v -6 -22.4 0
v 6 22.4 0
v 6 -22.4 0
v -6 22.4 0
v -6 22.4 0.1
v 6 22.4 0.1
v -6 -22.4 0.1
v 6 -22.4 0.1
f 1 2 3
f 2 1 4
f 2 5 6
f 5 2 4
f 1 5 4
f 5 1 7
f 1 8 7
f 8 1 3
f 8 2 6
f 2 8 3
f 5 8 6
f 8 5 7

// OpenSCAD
// file: ../p/box5-12.scad
use <../lib.scad>
function ldraw_lib__box5_12() = [
// 0 Box with 5 Faces without Any Edges
// 0 Name: box5-12.dat
// 0 Author: Chris Dee [cwdee]
// 0 !LDRAW_ORG Primitive UPDATE 2009-02
// 0 !LICENSE Licensed under CC BY 4.0 : see CAreadme.txt
// 
// 0 BFC CERTIFY CCW
  [0,"BFC","CERTIFY"],
  [0,"BFC","CCW"],
// 
// 0 !HISTORY 2009-09-03 [PTadmin] Official Update 2009-02
// 
// 
// 4 16 1 1 1 1 1 -1 -1 1 -1 -1 1 1
  [4,16,1,1,1,1,1,-1,-1,1,-1,-1,1,1],
// 4 16 -1 0 1 1 0 1 1 1 1 -1 1 1
  [4,16,-1,0,1,1,0,1,1,1,1,-1,1,1],
// 4 16 -1 0 -1 -1 0 1 -1 1 1 -1 1 -1
  [4,16,-1,0,-1,-1,0,1,-1,1,1,-1,1,-1],
// 4 16 1 0 -1 -1 0 -1 -1 1 -1 1 1 -1
  [4,16,1,0,-1,-1,0,-1,-1,1,-1,1,1,-1],
// 4 16 1 0 1 1 0 -1 1 1 -1 1 1 1
  [4,16,1,0,1,1,0,-1,1,1,-1,1,1,1],
// 0
];
module ldraw_lib__box5_12(step=0, col=false, unit=2/5, alt=false, line=0.2, solid=!$preview)
    makepoly(ldraw_lib__box5_12(), step=step, col=col, unit=unit, alt=alt, line=line, solid=solid);
ldraw_lib__box5_12(line=0.2);
// main file
use <../lib.scad>
use <../p/box5-12.scad>
function ldraw_lib__6342869a() = [
// 0 Sticker  5.6 x  1.5 Chrome
// 0 Name: 6342869a.dat
// 0 Author: Orion Pobursky [OrionP]
// 0 !LDRAW_ORG Part UPDATE 2024-04
// 0 !LICENSE Licensed under CC BY 4.0 : see CAreadme.txt
// 
// 0 BFC CERTIFY CCW
  [0,"BFC","CERTIFY"],
  [0,"BFC","CCW"],
// 
// 0 !KEYWORDS Discovery, Set 10283
// 
// 0 !HISTORY 2024-05-28 [OrionP] Official Update 2024-04
// 
// 
// 1 16 0 -0.25 0 15 0 0 0 .25 0 0 0 56 box5-12.dat
  [1,16,0,-0.25,0,15,0,0,0,.25,0,0,0,56, ldraw_lib__box5_12()],
// 4 383 15 -0.25 56 -15 -0.25 56 -15 -0.25 -56 15 -0.25 -56
  [4,383,15,-0.25,56,-15,-0.25,56,-15,-0.25,-56,15,-0.25,-56],
];
module ldraw_lib__6342869a(step=0, col=false, unit=2/5, alt=false, line=0.2, solid=!$preview)
    makepoly(ldraw_lib__6342869a(), step=step, col=col, unit=unit, alt=alt, line=line, solid=solid);
ldraw_lib__6342869a(line=0.2);
